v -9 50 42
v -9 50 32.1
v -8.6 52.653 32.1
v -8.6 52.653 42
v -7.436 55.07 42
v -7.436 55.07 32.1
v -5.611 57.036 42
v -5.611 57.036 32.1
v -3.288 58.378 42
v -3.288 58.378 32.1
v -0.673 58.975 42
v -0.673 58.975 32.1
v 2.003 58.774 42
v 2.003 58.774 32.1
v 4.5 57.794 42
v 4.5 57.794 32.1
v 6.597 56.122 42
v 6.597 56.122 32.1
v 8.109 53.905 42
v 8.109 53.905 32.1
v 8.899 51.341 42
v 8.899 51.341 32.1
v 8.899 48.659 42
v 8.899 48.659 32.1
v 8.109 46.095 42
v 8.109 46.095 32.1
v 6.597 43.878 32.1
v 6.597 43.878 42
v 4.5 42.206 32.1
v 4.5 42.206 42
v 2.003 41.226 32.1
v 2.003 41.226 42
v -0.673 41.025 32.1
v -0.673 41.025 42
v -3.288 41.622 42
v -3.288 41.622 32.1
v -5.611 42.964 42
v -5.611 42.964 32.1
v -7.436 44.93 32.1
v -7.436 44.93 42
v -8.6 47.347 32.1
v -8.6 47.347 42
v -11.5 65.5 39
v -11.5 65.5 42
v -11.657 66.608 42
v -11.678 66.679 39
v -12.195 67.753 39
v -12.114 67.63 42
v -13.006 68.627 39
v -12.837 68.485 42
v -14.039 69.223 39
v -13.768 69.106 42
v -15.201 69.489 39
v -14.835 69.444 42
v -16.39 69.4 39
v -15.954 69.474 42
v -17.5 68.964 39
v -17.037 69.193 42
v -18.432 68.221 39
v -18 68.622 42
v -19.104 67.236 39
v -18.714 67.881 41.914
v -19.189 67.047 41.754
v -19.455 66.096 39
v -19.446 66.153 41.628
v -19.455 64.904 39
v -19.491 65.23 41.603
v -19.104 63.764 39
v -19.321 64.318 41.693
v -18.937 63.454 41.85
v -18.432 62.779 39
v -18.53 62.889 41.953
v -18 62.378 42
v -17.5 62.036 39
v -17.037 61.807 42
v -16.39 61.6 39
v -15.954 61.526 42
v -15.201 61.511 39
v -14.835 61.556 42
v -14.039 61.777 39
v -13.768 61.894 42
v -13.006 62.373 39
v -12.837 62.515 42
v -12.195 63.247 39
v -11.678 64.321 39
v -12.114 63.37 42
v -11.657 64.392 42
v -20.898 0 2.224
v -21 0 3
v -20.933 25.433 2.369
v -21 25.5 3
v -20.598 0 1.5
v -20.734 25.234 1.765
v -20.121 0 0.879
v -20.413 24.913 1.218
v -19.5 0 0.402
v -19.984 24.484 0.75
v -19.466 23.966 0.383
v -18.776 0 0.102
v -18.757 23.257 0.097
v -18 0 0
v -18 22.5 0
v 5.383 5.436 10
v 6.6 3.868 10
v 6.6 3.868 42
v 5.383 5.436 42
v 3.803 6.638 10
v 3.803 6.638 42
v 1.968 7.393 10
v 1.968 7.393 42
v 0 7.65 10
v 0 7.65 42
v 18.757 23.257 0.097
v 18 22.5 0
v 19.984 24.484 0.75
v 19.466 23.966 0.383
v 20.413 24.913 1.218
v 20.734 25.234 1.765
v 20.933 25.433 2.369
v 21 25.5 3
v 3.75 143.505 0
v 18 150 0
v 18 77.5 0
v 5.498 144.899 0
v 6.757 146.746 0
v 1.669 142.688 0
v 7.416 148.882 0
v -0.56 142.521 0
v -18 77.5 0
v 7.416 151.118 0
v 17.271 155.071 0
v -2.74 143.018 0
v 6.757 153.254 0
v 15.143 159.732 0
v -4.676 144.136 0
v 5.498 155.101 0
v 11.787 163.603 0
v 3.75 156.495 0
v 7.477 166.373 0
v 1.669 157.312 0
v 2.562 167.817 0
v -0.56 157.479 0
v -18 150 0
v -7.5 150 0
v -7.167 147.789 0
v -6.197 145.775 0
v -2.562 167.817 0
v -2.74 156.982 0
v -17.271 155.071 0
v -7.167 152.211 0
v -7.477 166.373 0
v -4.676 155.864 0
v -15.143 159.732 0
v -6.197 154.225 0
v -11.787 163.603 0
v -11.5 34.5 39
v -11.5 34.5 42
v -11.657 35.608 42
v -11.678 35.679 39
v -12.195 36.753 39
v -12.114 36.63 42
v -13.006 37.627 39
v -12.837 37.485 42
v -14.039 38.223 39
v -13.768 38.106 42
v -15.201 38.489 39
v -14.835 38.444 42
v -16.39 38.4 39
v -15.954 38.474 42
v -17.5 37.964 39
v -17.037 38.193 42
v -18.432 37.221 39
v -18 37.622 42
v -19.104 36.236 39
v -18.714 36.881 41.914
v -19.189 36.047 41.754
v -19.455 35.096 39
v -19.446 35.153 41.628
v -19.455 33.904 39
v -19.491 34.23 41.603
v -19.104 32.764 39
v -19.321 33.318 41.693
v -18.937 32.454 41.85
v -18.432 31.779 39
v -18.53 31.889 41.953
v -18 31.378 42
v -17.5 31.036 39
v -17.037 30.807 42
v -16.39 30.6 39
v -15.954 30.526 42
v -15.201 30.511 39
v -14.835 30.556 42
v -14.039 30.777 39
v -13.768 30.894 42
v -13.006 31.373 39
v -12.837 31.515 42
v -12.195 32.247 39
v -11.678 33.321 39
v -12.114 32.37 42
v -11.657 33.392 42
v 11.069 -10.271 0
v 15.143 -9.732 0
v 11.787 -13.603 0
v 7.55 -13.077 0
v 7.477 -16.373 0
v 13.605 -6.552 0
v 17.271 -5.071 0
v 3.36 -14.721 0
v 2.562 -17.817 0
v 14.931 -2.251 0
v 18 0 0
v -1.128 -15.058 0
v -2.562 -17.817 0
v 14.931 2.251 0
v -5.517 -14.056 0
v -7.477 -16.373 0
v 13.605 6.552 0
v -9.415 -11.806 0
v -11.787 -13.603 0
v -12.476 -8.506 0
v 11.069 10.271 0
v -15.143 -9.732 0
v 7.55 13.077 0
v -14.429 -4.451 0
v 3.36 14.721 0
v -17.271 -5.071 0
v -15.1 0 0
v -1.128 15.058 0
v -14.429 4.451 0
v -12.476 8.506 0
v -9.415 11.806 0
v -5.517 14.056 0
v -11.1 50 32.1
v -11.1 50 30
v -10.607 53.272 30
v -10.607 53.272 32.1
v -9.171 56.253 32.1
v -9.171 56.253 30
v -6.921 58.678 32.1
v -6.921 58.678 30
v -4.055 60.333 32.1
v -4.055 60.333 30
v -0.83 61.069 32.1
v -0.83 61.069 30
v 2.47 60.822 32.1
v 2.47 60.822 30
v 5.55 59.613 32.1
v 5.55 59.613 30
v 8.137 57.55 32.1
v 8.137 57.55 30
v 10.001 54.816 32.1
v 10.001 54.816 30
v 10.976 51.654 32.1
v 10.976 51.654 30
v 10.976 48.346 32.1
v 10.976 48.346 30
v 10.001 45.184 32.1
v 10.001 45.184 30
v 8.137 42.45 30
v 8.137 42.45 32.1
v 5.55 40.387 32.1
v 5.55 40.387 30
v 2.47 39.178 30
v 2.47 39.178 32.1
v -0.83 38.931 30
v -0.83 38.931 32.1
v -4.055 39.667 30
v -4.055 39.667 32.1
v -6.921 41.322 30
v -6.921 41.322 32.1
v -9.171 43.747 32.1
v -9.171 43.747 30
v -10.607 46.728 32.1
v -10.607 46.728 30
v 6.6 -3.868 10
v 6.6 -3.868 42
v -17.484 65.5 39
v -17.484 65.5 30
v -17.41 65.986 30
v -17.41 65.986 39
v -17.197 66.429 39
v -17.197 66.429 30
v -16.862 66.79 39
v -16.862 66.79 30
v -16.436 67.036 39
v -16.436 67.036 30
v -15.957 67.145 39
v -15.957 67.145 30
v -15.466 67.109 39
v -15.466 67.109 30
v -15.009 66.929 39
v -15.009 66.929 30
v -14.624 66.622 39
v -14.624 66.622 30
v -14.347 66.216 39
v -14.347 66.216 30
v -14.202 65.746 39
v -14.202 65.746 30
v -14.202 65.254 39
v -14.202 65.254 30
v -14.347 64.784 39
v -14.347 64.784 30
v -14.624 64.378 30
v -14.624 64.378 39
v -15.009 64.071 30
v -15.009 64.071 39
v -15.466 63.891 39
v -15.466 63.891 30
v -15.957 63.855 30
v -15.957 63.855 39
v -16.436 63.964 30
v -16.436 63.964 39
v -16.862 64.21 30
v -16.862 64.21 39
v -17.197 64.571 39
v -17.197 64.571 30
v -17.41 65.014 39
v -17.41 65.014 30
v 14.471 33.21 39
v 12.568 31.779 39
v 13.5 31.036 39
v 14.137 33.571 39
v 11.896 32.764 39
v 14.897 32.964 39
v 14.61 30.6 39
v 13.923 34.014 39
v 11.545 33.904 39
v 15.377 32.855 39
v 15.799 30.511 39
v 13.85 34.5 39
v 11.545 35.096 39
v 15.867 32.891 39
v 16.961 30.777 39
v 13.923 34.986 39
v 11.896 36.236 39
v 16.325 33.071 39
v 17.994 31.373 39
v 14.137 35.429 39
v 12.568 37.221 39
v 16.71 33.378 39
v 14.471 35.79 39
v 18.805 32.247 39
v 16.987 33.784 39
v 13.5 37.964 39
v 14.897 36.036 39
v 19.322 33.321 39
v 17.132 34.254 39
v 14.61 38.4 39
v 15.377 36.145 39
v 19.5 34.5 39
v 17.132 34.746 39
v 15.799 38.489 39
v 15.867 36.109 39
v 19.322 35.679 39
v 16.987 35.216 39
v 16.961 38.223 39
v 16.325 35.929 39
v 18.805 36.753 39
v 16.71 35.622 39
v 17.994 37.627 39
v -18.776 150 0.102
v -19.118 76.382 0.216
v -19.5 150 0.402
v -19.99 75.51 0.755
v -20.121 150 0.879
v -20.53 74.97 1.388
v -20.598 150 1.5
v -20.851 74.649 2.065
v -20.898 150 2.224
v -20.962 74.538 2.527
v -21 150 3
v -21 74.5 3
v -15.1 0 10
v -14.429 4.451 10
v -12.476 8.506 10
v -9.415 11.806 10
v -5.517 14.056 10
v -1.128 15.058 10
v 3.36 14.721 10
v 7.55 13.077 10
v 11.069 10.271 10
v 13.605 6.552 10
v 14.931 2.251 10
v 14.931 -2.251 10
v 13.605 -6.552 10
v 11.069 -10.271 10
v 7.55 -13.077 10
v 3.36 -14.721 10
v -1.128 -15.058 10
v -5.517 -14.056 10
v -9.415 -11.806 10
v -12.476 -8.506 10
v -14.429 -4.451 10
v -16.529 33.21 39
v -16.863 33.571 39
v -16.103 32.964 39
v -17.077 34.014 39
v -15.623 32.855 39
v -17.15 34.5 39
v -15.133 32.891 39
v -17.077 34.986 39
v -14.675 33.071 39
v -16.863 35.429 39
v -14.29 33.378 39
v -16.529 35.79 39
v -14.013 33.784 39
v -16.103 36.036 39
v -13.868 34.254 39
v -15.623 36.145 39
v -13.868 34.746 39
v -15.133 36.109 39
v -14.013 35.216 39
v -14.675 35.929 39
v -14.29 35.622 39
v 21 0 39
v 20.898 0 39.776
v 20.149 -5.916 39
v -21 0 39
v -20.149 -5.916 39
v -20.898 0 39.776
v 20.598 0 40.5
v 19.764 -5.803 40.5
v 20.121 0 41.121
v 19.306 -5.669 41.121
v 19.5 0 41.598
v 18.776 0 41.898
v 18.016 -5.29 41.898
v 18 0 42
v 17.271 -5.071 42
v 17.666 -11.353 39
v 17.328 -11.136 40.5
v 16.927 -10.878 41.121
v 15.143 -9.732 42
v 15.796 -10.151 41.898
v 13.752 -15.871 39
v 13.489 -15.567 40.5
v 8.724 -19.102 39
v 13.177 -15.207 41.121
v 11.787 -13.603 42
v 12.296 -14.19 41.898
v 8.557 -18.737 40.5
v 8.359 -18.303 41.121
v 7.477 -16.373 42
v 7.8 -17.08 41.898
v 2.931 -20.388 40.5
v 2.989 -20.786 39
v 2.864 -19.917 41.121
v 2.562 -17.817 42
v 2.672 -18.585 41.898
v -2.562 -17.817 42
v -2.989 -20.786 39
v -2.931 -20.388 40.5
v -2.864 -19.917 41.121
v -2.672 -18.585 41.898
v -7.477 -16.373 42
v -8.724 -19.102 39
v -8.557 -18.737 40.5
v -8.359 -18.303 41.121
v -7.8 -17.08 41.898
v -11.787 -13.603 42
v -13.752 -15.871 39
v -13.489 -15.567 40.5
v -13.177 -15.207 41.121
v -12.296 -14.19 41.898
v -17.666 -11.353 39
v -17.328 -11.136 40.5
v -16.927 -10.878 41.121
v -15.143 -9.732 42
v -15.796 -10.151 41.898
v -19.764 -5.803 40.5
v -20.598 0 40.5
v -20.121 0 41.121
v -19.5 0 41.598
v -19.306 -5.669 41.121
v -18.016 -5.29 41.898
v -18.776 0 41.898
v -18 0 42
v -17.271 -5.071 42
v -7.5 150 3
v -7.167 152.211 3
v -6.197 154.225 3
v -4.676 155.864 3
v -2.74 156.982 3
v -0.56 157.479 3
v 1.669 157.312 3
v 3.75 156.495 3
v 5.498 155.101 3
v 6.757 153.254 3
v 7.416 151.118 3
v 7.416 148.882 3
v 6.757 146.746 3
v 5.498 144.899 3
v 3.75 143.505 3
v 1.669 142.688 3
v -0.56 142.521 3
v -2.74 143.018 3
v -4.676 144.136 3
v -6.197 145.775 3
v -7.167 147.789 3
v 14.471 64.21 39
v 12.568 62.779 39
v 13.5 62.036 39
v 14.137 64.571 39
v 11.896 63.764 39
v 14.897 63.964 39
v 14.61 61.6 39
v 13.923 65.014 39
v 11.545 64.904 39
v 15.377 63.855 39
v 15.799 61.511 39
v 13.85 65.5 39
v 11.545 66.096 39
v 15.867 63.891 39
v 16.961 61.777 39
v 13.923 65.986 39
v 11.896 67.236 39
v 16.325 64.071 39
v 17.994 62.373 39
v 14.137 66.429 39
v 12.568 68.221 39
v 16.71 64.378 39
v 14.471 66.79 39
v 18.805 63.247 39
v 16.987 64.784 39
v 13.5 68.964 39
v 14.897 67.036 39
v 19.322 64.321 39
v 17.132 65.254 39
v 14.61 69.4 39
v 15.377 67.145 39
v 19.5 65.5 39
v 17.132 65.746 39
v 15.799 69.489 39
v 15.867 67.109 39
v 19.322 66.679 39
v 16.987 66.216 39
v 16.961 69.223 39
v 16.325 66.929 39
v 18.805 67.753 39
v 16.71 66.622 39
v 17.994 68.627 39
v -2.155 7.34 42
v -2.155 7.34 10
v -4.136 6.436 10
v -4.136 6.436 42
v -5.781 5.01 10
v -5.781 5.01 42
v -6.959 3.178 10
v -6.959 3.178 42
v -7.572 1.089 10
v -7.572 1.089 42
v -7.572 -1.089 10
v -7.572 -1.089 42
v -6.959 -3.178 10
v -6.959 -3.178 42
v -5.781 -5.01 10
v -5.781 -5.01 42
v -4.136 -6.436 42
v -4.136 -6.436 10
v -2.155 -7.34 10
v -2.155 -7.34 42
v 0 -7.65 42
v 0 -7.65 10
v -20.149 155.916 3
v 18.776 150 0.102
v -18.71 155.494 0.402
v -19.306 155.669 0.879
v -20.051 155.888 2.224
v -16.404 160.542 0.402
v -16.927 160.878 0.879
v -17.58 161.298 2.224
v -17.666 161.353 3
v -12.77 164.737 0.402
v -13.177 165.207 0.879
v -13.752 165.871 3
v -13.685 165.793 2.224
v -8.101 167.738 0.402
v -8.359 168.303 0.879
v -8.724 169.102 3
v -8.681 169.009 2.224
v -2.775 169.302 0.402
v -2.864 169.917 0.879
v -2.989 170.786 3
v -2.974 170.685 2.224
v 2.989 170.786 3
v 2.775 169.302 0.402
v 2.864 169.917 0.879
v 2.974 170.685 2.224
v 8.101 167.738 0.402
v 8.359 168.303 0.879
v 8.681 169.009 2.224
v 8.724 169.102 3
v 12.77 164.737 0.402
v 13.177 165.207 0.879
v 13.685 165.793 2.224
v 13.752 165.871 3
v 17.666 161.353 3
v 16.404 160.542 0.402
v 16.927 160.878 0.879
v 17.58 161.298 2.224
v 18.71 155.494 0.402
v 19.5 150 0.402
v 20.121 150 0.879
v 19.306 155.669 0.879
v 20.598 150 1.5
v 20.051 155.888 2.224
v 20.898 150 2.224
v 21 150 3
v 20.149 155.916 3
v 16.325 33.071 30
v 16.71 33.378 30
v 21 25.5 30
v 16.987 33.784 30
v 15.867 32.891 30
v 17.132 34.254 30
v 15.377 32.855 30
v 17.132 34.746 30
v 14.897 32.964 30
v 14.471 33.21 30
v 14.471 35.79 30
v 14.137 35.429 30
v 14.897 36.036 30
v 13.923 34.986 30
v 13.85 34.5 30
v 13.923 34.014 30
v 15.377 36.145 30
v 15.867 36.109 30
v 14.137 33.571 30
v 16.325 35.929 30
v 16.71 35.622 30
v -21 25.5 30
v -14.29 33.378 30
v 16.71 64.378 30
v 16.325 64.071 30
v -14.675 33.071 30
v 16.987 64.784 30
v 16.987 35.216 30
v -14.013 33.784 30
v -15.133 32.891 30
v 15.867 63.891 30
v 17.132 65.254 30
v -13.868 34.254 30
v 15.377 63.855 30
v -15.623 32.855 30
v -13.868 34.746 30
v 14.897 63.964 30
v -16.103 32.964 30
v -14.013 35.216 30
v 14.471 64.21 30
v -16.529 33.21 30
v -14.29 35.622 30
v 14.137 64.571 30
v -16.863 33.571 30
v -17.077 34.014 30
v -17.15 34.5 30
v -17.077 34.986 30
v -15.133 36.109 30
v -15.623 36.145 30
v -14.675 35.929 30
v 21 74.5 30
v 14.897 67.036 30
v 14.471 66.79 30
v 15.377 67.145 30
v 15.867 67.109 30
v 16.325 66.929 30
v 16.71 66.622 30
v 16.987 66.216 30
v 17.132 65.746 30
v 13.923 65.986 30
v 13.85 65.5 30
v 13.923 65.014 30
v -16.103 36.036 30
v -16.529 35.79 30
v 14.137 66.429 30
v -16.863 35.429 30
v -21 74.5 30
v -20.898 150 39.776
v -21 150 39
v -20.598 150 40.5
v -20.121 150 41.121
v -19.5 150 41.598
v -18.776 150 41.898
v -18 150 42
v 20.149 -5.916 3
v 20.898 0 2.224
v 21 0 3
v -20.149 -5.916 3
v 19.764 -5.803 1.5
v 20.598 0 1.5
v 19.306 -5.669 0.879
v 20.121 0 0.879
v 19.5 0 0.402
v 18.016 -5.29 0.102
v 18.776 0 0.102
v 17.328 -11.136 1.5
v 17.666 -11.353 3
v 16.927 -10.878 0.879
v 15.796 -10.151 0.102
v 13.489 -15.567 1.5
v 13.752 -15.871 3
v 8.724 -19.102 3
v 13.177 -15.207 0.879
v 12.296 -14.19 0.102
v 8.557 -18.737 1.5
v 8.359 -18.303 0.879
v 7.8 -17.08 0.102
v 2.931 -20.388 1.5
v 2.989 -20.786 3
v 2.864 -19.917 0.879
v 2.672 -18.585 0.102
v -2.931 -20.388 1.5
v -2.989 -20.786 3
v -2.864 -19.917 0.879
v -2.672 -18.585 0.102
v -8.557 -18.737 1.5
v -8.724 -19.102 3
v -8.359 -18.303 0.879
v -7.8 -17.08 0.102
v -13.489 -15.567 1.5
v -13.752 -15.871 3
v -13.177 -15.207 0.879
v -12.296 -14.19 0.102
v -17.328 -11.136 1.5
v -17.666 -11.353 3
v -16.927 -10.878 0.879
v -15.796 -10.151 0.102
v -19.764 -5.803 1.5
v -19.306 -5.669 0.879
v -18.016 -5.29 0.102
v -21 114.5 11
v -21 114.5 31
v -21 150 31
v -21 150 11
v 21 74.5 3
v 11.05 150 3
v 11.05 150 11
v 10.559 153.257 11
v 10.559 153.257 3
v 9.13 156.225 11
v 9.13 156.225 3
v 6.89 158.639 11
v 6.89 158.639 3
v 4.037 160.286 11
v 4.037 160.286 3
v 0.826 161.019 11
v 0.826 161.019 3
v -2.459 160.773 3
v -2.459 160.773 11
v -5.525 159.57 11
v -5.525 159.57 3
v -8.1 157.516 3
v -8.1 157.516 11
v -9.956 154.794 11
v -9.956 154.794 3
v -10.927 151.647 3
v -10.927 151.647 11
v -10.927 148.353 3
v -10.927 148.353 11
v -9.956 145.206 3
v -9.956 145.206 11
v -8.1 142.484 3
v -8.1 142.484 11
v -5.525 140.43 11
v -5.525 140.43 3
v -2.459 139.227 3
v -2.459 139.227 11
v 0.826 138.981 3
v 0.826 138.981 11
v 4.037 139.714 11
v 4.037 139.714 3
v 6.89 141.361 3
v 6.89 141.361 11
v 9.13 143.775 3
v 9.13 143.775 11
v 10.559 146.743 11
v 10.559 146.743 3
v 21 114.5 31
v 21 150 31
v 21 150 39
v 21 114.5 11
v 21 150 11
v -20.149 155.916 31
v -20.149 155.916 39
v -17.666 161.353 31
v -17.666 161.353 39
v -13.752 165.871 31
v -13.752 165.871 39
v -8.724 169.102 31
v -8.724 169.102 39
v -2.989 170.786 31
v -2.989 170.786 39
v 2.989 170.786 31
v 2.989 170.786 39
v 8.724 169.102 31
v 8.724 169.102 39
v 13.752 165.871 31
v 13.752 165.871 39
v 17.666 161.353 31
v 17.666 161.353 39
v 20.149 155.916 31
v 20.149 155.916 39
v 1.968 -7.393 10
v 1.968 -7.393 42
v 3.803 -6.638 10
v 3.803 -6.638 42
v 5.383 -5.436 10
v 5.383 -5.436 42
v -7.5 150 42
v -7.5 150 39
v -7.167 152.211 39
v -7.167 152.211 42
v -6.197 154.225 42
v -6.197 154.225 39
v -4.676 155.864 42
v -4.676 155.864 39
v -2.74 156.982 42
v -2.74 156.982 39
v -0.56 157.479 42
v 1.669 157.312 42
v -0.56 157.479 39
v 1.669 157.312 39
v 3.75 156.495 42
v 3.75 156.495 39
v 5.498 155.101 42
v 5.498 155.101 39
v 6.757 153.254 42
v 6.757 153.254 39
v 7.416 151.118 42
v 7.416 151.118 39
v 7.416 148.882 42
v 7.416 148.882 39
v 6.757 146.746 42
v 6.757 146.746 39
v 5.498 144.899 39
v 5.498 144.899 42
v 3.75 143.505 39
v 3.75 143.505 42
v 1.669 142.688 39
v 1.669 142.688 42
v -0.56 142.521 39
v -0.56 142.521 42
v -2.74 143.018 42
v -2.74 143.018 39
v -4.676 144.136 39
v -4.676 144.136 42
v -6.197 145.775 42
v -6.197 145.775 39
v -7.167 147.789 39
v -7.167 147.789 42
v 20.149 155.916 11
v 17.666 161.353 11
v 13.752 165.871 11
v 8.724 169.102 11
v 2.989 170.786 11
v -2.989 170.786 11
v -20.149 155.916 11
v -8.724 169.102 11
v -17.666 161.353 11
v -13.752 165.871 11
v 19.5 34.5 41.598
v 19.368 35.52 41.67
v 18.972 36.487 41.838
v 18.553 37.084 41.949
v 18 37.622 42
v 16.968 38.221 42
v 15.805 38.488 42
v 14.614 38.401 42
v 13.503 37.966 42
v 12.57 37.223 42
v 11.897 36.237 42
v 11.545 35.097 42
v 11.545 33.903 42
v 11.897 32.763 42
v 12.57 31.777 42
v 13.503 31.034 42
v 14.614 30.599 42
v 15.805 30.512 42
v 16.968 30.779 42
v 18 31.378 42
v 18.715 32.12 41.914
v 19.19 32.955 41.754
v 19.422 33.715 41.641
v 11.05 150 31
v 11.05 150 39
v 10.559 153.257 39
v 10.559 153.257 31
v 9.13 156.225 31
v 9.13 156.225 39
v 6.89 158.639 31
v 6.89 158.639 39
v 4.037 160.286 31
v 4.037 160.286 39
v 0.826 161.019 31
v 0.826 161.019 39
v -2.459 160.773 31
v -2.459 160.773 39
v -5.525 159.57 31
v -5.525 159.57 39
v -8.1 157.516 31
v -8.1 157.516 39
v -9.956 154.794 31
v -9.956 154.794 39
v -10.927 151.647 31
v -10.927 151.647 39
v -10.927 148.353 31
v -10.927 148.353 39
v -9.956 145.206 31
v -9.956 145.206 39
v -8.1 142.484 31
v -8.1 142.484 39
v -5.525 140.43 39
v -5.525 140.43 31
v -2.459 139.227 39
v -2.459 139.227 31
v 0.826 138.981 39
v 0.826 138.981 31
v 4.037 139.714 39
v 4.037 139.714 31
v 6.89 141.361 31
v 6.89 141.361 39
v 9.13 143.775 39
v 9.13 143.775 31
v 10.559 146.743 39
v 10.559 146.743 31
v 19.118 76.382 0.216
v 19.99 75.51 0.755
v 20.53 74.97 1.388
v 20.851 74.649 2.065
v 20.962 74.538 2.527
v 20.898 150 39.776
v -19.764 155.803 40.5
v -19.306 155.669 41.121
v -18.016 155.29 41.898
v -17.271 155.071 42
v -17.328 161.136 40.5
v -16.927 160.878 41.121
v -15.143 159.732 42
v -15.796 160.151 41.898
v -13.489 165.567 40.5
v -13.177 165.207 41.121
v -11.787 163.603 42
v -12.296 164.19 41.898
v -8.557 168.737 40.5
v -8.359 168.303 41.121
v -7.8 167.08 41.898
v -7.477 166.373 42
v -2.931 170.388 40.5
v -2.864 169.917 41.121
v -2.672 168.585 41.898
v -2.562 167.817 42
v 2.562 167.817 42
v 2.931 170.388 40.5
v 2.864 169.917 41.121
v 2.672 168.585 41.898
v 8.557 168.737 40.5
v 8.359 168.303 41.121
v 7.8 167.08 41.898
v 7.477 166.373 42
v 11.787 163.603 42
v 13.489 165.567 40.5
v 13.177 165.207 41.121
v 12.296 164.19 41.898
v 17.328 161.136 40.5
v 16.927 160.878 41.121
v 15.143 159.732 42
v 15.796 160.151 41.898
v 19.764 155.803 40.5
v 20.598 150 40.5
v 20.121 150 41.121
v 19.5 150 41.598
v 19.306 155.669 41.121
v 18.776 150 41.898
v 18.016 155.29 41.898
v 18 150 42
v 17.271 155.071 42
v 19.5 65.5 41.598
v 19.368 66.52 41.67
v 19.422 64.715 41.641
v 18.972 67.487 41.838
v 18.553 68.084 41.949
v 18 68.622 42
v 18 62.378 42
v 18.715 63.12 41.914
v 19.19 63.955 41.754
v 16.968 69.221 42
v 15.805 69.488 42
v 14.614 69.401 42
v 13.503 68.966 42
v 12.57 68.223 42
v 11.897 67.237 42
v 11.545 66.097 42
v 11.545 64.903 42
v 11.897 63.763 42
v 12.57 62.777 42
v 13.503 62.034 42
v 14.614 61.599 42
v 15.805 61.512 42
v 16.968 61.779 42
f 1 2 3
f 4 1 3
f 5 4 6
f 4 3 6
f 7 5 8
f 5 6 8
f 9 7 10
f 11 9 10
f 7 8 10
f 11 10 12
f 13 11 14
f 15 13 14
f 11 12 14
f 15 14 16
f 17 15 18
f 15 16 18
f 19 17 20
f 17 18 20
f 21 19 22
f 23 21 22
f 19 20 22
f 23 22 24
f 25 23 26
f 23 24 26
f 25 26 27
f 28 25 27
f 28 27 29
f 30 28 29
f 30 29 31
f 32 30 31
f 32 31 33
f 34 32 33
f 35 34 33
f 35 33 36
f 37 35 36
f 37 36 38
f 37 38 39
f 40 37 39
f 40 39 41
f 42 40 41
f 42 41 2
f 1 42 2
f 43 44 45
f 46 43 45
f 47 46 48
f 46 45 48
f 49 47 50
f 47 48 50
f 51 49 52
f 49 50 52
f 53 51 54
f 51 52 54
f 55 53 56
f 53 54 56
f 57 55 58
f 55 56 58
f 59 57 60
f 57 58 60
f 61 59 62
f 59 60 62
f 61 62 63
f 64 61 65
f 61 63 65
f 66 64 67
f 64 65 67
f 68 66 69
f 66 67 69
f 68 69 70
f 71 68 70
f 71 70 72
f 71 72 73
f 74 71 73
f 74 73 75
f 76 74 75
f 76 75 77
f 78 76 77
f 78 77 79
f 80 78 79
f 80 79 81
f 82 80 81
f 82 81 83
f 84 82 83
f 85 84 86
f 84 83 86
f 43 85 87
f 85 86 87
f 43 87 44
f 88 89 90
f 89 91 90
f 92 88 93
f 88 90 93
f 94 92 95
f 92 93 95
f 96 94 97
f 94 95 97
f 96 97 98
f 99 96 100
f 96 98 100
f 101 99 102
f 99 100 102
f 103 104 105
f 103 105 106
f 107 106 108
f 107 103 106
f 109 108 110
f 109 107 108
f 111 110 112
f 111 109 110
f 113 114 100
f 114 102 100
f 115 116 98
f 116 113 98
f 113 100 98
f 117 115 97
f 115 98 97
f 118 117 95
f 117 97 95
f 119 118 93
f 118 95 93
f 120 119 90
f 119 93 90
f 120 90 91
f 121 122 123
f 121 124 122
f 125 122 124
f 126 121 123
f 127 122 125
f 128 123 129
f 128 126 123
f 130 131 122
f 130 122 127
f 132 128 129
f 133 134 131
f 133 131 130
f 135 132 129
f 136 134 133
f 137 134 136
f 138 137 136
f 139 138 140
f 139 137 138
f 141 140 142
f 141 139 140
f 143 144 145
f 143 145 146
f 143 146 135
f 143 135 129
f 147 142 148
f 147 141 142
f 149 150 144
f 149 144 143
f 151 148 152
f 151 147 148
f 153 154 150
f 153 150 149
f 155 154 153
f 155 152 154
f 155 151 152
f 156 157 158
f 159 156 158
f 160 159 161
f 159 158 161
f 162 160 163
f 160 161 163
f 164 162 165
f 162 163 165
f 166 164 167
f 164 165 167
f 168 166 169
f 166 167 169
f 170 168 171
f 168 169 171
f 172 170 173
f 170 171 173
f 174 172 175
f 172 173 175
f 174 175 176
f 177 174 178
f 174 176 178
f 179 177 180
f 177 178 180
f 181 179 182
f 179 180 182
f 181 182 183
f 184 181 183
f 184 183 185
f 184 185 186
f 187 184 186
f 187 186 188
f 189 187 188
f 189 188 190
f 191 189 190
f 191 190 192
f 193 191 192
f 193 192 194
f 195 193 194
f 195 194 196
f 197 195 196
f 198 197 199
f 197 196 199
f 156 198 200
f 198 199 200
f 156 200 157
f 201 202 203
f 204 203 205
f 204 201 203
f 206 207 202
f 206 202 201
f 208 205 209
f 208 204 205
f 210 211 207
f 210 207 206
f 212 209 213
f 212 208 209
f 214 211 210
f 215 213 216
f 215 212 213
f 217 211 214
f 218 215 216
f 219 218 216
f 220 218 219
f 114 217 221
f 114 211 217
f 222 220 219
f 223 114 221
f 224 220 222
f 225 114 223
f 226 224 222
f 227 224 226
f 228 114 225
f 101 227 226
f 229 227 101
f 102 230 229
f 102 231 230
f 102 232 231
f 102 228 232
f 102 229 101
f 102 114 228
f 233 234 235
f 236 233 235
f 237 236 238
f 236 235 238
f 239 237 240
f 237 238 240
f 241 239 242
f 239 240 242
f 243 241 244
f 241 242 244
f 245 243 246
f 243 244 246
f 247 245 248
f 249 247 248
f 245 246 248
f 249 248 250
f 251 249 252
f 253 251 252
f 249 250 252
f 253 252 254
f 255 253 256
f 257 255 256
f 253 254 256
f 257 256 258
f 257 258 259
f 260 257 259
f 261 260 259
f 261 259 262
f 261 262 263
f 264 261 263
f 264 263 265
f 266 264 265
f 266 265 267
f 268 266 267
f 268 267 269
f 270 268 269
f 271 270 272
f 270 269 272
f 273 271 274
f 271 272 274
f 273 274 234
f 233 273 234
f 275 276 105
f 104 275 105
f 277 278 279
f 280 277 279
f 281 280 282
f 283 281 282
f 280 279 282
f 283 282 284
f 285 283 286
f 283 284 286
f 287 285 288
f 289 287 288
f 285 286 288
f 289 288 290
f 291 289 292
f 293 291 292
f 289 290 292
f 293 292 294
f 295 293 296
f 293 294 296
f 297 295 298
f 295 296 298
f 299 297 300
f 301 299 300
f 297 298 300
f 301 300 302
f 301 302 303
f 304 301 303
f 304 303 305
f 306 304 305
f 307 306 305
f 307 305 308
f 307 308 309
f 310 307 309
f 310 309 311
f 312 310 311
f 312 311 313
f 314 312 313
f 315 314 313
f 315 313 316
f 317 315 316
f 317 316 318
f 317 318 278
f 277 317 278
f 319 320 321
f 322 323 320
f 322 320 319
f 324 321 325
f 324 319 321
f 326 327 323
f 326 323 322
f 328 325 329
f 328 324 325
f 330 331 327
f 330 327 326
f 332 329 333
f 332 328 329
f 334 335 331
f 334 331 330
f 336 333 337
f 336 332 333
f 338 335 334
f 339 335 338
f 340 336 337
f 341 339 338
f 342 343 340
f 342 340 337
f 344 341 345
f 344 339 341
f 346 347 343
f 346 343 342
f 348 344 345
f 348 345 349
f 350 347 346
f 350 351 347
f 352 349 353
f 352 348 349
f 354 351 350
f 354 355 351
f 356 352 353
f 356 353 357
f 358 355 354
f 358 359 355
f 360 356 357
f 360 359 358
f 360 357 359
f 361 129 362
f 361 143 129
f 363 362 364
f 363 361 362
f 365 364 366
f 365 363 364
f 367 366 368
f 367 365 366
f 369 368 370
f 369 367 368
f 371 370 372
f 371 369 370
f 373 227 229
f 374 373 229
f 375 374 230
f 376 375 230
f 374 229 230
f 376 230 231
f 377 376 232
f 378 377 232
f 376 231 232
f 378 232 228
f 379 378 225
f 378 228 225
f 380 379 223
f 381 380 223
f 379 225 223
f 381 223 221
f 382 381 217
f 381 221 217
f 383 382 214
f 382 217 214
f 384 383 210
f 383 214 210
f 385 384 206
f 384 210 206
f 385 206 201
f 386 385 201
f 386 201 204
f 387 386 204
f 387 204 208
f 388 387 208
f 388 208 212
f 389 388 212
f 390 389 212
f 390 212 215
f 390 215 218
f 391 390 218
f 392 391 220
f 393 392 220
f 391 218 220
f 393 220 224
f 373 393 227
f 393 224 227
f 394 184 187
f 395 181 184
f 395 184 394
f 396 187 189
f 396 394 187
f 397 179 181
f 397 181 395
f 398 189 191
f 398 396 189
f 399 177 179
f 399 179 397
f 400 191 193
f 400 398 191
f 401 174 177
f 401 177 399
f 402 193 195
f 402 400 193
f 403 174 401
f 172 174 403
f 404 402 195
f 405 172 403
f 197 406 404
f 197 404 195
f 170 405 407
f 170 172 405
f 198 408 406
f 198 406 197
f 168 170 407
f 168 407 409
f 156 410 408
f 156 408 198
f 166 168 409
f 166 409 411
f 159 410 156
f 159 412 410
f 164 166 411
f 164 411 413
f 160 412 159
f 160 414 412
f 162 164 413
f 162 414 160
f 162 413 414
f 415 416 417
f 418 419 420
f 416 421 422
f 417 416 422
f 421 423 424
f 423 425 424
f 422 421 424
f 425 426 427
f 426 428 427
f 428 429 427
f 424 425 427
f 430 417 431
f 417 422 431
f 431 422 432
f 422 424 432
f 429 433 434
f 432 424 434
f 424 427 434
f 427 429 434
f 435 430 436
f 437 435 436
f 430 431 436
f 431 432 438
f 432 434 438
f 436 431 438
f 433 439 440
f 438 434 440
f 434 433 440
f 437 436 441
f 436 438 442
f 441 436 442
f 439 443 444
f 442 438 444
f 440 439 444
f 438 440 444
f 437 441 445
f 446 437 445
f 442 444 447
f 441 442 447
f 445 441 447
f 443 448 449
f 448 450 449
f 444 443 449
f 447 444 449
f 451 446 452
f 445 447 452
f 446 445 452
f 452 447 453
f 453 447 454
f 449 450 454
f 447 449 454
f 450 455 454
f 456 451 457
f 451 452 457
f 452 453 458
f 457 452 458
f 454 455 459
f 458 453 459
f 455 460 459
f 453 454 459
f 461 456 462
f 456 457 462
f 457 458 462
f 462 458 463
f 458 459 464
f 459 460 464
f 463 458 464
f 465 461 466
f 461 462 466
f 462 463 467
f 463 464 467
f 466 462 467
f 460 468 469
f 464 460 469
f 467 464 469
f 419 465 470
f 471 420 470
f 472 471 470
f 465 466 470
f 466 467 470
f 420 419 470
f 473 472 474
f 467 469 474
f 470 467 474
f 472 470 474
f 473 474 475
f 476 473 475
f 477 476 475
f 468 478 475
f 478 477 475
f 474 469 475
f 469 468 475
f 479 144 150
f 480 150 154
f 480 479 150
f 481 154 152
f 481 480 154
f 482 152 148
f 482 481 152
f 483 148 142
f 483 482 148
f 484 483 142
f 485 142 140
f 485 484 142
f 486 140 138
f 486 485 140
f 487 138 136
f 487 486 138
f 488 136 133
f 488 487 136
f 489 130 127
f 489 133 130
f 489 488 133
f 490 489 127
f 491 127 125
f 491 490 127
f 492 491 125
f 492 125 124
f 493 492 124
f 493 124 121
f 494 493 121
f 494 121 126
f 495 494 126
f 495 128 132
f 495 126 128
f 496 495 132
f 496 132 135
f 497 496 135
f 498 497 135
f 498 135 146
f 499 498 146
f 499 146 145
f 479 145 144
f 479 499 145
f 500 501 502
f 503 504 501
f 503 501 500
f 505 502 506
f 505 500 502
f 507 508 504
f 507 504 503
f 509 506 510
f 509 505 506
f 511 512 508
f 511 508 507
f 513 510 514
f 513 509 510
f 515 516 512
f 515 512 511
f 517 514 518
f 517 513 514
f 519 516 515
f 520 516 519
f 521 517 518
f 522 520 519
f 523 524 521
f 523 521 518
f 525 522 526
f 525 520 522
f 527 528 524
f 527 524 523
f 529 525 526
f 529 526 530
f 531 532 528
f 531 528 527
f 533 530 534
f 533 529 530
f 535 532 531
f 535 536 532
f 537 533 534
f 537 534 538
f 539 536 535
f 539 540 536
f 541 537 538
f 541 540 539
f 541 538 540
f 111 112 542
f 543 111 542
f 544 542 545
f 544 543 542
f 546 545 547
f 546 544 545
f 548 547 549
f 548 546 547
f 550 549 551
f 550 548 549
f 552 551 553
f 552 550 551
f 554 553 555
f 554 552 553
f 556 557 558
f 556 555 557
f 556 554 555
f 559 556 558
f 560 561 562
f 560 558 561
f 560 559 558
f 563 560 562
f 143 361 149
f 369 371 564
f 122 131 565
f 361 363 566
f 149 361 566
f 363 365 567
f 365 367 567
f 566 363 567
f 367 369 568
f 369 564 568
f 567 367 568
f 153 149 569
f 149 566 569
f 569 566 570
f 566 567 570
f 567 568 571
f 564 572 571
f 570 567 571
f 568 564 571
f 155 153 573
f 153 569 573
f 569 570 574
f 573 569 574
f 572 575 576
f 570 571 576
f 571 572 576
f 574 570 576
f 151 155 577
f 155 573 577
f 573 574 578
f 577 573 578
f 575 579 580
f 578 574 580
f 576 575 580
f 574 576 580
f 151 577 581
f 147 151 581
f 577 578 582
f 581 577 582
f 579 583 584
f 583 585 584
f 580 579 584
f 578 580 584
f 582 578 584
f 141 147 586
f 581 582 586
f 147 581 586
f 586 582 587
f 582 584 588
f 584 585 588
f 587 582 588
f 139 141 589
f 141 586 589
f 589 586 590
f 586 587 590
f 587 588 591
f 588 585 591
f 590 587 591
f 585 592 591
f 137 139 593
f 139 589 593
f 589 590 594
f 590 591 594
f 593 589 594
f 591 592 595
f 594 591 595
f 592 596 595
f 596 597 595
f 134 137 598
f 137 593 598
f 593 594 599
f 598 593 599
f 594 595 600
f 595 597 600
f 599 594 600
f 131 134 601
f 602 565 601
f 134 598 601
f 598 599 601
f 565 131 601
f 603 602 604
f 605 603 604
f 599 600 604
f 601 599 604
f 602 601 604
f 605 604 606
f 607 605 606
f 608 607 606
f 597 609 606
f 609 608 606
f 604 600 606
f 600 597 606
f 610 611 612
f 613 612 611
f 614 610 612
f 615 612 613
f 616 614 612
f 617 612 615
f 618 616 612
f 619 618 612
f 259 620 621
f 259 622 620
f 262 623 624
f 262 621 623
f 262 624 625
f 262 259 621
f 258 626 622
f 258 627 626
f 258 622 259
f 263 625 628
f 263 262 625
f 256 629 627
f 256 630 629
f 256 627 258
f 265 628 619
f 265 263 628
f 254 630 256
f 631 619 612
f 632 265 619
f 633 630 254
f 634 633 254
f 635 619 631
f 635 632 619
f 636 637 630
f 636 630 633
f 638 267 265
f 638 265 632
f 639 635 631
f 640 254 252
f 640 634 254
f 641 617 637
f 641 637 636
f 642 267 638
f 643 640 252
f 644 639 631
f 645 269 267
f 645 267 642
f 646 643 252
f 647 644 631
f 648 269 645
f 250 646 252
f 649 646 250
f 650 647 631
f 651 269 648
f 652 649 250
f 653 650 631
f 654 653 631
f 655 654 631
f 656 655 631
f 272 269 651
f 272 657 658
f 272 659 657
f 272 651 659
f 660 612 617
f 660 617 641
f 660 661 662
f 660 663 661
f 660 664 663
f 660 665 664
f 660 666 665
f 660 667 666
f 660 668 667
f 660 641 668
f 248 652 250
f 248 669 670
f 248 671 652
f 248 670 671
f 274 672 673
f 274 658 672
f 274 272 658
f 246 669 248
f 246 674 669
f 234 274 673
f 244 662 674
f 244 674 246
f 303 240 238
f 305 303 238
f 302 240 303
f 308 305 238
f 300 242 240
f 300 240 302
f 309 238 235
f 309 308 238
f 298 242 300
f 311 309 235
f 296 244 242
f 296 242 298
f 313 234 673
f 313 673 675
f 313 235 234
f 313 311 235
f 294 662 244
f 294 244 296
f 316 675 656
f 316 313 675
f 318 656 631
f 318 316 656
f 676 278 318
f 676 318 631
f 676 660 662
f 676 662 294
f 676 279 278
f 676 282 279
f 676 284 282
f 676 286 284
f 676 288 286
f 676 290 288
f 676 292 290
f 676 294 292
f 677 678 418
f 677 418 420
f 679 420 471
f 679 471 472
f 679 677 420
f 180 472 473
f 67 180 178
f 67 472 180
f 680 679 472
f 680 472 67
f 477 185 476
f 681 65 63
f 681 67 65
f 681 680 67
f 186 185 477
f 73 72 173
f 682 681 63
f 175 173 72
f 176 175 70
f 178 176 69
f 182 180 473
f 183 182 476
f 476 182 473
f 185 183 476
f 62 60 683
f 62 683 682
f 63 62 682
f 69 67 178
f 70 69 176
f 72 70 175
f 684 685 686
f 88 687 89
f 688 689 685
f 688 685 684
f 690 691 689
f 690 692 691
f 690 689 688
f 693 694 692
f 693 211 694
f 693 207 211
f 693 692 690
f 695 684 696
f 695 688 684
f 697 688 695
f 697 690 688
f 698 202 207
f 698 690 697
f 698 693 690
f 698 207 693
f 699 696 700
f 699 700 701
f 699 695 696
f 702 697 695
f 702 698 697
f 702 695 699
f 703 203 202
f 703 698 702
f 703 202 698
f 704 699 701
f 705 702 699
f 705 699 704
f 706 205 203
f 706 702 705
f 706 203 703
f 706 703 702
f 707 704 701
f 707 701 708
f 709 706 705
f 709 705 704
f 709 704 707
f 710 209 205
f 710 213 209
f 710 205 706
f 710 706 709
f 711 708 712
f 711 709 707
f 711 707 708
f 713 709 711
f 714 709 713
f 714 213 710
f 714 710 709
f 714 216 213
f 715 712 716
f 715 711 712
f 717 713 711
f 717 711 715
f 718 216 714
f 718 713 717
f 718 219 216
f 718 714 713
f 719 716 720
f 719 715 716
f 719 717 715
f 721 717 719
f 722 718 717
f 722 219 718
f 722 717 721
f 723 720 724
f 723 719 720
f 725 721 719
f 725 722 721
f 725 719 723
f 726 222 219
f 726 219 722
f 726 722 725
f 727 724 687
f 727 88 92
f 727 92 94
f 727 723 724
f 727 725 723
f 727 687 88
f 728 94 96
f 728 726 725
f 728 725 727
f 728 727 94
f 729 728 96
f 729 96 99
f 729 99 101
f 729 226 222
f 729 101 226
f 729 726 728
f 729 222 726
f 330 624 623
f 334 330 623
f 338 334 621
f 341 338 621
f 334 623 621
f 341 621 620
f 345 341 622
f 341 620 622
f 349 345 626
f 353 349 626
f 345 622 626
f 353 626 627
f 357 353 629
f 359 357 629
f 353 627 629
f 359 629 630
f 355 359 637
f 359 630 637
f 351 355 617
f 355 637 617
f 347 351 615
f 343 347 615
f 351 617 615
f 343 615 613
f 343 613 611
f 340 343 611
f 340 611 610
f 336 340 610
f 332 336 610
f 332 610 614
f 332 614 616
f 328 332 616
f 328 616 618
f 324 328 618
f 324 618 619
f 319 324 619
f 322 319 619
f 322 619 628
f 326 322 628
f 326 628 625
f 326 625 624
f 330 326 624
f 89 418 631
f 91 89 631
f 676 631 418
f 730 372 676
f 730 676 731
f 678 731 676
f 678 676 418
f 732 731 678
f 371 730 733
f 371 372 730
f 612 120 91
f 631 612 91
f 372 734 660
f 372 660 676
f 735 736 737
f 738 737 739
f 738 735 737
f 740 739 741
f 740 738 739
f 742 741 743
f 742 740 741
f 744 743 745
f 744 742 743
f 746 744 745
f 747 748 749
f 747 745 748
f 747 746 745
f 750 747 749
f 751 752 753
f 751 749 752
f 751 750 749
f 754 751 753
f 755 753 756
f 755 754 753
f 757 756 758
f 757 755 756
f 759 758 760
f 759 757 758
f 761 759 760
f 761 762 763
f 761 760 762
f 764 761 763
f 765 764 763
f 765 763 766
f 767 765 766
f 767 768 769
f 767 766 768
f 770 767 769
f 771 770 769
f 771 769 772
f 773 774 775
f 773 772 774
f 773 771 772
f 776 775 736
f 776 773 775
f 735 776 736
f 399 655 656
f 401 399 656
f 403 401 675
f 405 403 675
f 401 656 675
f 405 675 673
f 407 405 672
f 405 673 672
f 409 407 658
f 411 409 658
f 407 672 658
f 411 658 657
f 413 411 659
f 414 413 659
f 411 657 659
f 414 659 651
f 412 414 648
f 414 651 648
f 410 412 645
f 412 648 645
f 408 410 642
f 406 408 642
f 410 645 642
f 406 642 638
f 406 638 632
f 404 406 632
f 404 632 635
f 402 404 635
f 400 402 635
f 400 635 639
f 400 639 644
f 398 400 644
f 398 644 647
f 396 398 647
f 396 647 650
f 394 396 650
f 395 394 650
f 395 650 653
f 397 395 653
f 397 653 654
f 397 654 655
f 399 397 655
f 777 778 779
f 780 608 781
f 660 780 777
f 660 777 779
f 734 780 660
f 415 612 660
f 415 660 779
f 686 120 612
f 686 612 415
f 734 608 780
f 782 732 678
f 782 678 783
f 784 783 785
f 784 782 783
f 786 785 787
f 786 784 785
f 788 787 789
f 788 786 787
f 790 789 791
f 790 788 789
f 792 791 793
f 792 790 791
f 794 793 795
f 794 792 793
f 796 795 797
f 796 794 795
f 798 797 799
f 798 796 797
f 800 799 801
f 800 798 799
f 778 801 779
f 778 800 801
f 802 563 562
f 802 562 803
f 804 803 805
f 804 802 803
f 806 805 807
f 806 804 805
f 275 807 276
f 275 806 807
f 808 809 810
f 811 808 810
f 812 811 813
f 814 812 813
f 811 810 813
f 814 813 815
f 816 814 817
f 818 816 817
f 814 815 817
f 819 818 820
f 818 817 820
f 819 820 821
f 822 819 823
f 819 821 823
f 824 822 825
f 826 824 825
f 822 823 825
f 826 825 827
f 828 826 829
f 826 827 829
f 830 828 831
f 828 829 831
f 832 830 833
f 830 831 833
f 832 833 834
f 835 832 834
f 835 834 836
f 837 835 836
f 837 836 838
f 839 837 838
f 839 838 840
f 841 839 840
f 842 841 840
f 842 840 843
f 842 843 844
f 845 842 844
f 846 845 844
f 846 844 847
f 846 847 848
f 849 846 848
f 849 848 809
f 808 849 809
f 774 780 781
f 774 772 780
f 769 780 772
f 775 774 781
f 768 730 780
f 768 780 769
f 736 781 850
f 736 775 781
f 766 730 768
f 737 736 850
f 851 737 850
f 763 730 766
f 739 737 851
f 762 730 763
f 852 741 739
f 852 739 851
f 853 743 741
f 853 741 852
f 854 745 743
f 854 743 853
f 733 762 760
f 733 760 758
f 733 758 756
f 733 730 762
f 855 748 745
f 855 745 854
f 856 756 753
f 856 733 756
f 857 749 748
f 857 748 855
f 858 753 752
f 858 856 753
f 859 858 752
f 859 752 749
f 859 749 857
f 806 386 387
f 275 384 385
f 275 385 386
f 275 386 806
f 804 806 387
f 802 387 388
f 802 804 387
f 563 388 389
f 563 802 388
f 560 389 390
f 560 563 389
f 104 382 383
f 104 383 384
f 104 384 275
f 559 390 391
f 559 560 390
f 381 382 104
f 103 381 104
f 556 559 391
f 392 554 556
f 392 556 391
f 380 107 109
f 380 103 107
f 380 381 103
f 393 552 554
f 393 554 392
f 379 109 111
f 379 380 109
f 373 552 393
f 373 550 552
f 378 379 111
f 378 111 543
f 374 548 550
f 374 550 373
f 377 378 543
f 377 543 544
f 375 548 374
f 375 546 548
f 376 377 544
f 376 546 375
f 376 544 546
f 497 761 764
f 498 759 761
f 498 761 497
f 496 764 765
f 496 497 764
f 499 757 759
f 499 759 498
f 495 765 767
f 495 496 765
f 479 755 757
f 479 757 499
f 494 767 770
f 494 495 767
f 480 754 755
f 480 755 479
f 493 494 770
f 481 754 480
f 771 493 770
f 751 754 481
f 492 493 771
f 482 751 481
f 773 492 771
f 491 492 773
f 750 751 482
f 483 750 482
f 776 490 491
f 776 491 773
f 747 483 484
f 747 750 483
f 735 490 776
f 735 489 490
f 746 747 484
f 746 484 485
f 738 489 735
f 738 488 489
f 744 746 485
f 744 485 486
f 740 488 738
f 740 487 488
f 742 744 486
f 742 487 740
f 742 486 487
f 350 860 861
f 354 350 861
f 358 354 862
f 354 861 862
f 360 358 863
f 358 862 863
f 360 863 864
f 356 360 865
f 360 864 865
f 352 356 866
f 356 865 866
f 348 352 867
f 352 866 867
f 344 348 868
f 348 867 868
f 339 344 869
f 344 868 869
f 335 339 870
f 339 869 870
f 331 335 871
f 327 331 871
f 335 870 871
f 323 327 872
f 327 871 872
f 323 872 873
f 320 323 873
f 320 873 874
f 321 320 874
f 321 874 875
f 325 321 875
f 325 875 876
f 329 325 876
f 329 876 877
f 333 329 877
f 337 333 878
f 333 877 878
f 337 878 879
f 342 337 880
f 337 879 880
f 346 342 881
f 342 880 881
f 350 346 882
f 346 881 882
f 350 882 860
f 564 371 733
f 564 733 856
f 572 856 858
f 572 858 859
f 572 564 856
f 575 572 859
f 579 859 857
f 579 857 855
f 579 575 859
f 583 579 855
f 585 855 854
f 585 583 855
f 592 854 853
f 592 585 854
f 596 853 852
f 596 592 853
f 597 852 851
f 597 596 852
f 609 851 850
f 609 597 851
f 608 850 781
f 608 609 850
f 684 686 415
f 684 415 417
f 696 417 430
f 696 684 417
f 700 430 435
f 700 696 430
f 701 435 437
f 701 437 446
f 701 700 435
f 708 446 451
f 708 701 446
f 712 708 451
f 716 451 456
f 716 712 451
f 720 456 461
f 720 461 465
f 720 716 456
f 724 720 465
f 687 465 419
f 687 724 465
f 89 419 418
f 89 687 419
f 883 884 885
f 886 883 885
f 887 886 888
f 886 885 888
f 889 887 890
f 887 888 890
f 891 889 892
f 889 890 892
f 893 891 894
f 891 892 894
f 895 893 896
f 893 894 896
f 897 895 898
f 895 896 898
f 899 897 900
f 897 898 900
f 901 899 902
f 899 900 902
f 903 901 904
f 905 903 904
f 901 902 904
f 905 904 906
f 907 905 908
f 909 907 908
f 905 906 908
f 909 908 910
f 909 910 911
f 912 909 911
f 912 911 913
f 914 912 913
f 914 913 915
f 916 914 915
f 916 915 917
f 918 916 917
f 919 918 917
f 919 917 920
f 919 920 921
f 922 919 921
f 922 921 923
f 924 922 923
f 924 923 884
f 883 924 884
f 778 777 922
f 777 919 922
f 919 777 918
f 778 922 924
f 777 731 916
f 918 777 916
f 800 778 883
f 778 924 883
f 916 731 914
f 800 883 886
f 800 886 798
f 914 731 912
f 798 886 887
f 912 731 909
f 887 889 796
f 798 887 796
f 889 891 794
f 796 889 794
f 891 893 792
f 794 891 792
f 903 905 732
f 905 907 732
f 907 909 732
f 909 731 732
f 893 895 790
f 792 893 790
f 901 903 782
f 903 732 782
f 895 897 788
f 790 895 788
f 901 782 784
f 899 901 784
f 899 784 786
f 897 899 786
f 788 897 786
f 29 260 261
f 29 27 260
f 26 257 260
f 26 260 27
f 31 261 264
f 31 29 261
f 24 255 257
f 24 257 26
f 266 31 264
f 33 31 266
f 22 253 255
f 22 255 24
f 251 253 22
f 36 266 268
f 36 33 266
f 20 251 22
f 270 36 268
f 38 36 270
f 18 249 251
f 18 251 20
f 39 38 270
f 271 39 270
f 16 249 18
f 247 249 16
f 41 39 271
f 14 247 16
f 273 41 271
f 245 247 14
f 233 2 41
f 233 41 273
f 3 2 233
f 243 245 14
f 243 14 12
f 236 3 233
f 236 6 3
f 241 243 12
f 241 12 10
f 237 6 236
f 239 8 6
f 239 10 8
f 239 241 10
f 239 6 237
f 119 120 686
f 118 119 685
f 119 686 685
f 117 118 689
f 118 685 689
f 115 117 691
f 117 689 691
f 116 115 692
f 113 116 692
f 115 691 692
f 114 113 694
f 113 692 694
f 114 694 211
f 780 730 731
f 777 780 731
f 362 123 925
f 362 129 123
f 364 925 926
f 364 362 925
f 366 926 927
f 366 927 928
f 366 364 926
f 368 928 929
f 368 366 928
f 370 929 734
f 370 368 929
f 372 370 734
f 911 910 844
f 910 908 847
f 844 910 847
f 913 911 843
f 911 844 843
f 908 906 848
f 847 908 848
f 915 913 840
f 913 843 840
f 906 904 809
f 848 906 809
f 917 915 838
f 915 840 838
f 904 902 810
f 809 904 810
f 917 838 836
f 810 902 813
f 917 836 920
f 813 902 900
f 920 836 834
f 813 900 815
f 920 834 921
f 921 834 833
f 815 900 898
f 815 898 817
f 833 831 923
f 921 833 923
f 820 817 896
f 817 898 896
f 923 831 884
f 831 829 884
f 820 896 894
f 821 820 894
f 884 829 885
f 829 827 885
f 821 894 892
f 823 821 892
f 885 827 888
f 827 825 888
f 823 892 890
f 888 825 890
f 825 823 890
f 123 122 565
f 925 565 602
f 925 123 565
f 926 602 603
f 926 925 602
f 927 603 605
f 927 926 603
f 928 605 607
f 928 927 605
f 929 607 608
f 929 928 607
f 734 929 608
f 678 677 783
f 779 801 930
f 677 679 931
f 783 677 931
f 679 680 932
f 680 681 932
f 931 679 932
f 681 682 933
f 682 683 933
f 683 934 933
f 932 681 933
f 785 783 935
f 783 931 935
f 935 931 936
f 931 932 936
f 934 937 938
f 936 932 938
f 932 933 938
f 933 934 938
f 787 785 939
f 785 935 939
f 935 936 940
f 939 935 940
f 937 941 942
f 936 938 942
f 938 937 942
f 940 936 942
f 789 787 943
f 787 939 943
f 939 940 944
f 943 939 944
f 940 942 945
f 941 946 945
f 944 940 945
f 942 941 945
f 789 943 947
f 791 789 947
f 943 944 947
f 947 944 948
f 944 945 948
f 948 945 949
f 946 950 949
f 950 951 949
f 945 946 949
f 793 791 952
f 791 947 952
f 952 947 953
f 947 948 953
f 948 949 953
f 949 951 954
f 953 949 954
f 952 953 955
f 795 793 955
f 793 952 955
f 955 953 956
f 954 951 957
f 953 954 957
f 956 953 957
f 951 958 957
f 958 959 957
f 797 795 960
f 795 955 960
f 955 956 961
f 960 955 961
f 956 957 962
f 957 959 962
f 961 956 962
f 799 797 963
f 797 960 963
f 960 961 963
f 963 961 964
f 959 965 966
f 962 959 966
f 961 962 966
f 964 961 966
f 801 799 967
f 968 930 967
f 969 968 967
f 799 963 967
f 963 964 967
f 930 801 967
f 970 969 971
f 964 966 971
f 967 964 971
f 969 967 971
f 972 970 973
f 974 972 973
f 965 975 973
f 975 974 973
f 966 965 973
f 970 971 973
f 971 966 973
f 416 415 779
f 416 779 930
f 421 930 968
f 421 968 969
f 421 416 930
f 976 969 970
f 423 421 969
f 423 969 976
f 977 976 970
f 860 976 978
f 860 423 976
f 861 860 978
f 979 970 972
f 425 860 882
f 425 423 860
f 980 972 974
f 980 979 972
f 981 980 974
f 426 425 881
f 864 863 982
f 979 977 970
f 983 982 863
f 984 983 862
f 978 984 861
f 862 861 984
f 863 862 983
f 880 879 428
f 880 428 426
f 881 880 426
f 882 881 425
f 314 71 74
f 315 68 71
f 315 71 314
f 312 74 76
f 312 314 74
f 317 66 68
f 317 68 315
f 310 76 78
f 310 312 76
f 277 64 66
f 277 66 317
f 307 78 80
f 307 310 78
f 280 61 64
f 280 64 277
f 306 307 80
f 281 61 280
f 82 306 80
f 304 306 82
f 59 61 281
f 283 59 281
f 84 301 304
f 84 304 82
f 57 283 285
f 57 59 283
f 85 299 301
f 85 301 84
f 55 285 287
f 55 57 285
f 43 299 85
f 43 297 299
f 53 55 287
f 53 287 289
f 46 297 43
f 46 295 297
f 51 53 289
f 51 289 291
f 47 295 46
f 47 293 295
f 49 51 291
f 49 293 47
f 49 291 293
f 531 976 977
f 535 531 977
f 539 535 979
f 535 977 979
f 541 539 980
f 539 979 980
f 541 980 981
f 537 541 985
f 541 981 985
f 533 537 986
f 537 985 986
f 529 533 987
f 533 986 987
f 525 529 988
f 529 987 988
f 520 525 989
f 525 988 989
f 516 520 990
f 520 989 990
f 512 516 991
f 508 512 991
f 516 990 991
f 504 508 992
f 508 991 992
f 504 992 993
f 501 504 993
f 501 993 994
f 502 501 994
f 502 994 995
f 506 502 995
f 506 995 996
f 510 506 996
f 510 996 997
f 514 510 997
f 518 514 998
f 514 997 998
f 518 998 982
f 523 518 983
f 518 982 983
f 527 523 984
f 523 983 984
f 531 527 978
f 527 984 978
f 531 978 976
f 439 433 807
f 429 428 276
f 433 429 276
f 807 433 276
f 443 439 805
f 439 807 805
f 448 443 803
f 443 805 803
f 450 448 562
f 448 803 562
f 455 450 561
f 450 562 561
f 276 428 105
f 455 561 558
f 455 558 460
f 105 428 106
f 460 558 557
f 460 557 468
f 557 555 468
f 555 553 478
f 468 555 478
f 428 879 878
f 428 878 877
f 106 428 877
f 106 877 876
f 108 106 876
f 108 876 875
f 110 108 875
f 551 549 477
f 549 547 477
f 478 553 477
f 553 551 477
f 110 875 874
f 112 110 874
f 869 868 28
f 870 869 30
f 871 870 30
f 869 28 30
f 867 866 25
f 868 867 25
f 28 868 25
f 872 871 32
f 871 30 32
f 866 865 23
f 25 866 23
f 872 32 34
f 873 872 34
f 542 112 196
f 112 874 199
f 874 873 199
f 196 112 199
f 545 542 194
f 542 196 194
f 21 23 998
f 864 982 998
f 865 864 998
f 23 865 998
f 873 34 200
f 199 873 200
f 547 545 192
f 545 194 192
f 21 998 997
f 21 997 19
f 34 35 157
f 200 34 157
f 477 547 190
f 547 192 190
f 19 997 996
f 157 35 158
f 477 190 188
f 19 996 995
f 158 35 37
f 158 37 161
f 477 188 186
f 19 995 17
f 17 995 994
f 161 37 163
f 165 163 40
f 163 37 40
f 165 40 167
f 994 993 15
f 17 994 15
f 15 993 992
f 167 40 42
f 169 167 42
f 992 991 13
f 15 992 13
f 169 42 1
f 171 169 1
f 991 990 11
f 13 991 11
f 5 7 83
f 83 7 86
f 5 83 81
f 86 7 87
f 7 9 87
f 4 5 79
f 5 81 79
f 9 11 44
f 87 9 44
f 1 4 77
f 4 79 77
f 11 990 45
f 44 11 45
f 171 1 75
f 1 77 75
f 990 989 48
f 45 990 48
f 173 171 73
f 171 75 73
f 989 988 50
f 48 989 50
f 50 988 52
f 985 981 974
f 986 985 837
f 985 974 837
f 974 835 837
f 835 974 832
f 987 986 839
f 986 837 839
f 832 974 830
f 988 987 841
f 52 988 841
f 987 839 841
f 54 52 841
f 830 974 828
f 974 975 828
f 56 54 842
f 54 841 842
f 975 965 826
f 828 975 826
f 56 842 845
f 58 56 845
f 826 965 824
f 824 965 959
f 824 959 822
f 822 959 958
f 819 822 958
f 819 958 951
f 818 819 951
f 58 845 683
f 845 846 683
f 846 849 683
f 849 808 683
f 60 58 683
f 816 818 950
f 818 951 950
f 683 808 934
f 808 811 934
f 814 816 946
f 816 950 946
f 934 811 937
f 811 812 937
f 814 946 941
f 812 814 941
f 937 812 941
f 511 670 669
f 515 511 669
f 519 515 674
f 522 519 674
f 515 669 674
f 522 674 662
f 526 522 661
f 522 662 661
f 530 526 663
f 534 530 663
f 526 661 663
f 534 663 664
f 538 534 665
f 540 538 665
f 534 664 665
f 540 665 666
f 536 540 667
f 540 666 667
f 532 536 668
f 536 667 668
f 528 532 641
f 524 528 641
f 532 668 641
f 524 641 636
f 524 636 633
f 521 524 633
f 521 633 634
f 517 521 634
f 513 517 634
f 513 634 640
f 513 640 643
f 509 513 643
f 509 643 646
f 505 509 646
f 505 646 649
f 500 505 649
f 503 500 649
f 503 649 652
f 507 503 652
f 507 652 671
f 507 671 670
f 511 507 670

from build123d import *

# Parameters (mm, degrees)
EXTRUDE_1_DEPTH          = 42
SKETCH_2_R               = 9
CUT_EXTRUDE_1_DEPTH      = 178.330200474
SKETCH_3_W               = 50
SKETCH_3_H               = 49
CUT_EXTRUDE_2_DEPTH      = 30
SKETCH_4_W               = 20
SKETCH_4_H               = 71
CUT_EXTRUDE_3_DEPTH      = 182.022098099
CUT_EXTRUDE_START        = -3
SKETCH_5_R               = 11.05
CUT_EXTRUDE_4_DEPTH      = 10
FILLET_1_R               = 3
FILLET_2_R               = 3
SKETCH_6_R               = 7.5
CUT_EXTRUDE_5_DEPTH      = 10
SKETCH_8_R               = 1.65
CUT_EXTRUDE_6_DEPTH      = 175.877099799
SKETCH_9_R               = 4
CUT_EXTRUDE_7_DEPTH      = 3
CUT_EXTRUDE_8_DEPTH      = 178.330200582
CUT_EXTRUDE_8_DEPTH_BACK = 178.330200582
SKETCH_14_R              = 15.1
CUT_EXTRUDE_9_DEPTH      = 10
SKETCH_15_R              = 11.1
CUT_EXTRUDE_10_DEPTH     = 2.1


with BuildPart() as part:
    # 草图1 → 凸台-拉伸1 (new body)
    with BuildSketch(Plane.XY):
        with BuildLine():
            Line((-21, 0), (-21, 150))
            ThreePointArc((-21, 150), (0, 171), (21, 150))
            Line((21, 150), (21, 0))
            ThreePointArc((21, 0), (0, -21), (-21, 0))
        make_face()
    extrude(amount=EXTRUDE_1_DEPTH)

    # 草图2 → 切除-拉伸1 (cut, through all)
    with BuildSketch(Plane(origin=(0, 0, 0), x_dir=(-1, 0, 0), z_dir=(0, 0, -1))):
        with Locations((0, 50)):
            Circle(SKETCH_2_R)
    extrude(amount=-CUT_EXTRUDE_1_DEPTH, mode=Mode.SUBTRACT)

    # 草图3 → 切除-拉伸2 (cut)
    with BuildSketch(Plane(origin=(0, 0, 0), x_dir=(-1, 0, 0), z_dir=(0, 0, -1))):
        with Locations((0, 50)):
            Rectangle(SKETCH_3_W, SKETCH_3_H)
    extrude(amount=-CUT_EXTRUDE_2_DEPTH, mode=Mode.SUBTRACT)

    # 草图4 → 切除-拉伸3 (cut, through all)
    with BuildSketch(Plane.ZY.offset(21)):
        with Locations((21, 150)):
            Rectangle(SKETCH_4_W, SKETCH_4_H)
    extrude(amount=-CUT_EXTRUDE_3_DEPTH, mode=Mode.SUBTRACT)

    # 草图5 → 切除-拉伸4 (cut)
    with BuildSketch(Plane.XY.offset(42).offset(CUT_EXTRUDE_START)):
        with Locations((0, 150)):
            Circle(SKETCH_5_R)
    cut_extrude_4 = extrude(amount=-CUT_EXTRUDE_4_DEPTH, mode=Mode.SUBTRACT)

    # 圆角1
    fillet_1_edges = [part.edges().sort_by_distance(p)[0] for p in [
        (0, 171, 42),
        (-21, 75, 42),
        (0, -21, 42),
        (21, 75, 42),
    ]]
    fillet(fillet_1_edges, radius=FILLET_1_R)

    # 圆角2
    fillet_2_edges = [part.edges().sort_by_distance(p)[0] for p in [
        (-21, 12.75, 0),
        (21, 112.25, 0),
        (0, 25.5, 0),
        (0, 74.5, 0),
        (-21, 112.25, 0),
        (0, 171, 0),
        (21, 12.75, 0),
        (0, -21, 0),
    ]]
    fillet(fillet_2_edges, radius=FILLET_2_R)

    # 草图6 → 切除-拉伸5 (cut)
    with BuildSketch(Plane(origin=(0, 0, 39), x_dir=(-1, 0, 0), z_dir=(0, 0, -1))):
        with Locations((0, 150)):
            Circle(SKETCH_6_R)
    cut_extrude_5 = extrude(amount=-CUT_EXTRUDE_5_DEPTH, mode=Mode.SUBTRACT)

    # 镜向1: 切除-拉伸4, 切除-拉伸5 across plane
    add(cut_extrude_4.mirror(Plane.XY.offset(21)), mode=Mode.SUBTRACT)
    add(cut_extrude_5.mirror(Plane.XY.offset(21)), mode=Mode.SUBTRACT)

    # 草图8 → 切除-拉伸6 (cut, through all)
    with BuildSketch(Plane(origin=(0, 0, 30), x_dir=(-1, 0, 0), z_dir=(0, 0, -1))):
        with Locations((-15.5, 34.5)):
            Circle(SKETCH_8_R)
        with Locations((-15.5, 65.5)):
            Circle(SKETCH_8_R)
        with Locations((15.833547664, 65.5)):
            Circle(SKETCH_8_R)
        with Locations((15.5, 34.5)):
            Circle(SKETCH_8_R)
    extrude(amount=-CUT_EXTRUDE_6_DEPTH, mode=Mode.SUBTRACT)

    # 草图9 → 切除-拉伸7 (cut)
    with BuildSketch(Plane.XY.offset(42)):
        with Locations((15.5, 65.5)):
            Circle(SKETCH_9_R)
        with Locations((15.5, 34.5)):
            Circle(SKETCH_9_R)
        with Locations((-15.5, 65.5)):
            Circle(SKETCH_9_R)
        with Locations((-15.5, 34.5)):
            Circle(SKETCH_9_R)
    extrude(amount=-CUT_EXTRUDE_7_DEPTH, mode=Mode.SUBTRACT)

    # 草图13 → 切除-拉伸8 (cut, two sides: drawn at the far end of the back side and taken through both)
    with BuildSketch(Plane.XY.offset(42).offset(-CUT_EXTRUDE_8_DEPTH_BACK)):
        with BuildLine():
            ThreePointArc((6.6, 3.868139087), (3.803369295, 6.637535839), (0, 7.65))
            Line((0, 7.65), (0, -7.65))
            ThreePointArc((0, -7.65), (3.803369295, -6.637535839), (6.6, -3.868139087))
            Line((6.6, -3.868139087), (6.6, 3.868139087))
        make_face()
        with BuildLine():
            Line((0, -7.65), (0, 7.65))
            ThreePointArc((0, 7.65), (-7.65, 0), (0, -7.65))
        make_face()
    extrude(amount=CUT_EXTRUDE_8_DEPTH + CUT_EXTRUDE_8_DEPTH_BACK, mode=Mode.SUBTRACT)

    # 草图14 → 切除-拉伸9 (cut)
    with BuildSketch(Plane(origin=(0, 0, 0), x_dir=(-1, 0, 0), z_dir=(0, 0, -1))):
        Circle(SKETCH_14_R)
    extrude(amount=-CUT_EXTRUDE_9_DEPTH, mode=Mode.SUBTRACT)

    # 草图15 → 切除-拉伸10 (cut)
    with BuildSketch(Plane(origin=(0, 0, 30), x_dir=(-1, 0, 0), z_dir=(0, 0, -1))):
        with Locations((0, 50)):
            Circle(SKETCH_15_R)
    extrude(amount=-CUT_EXTRUDE_10_DEPTH, mode=Mode.SUBTRACT)


solid = part.part
